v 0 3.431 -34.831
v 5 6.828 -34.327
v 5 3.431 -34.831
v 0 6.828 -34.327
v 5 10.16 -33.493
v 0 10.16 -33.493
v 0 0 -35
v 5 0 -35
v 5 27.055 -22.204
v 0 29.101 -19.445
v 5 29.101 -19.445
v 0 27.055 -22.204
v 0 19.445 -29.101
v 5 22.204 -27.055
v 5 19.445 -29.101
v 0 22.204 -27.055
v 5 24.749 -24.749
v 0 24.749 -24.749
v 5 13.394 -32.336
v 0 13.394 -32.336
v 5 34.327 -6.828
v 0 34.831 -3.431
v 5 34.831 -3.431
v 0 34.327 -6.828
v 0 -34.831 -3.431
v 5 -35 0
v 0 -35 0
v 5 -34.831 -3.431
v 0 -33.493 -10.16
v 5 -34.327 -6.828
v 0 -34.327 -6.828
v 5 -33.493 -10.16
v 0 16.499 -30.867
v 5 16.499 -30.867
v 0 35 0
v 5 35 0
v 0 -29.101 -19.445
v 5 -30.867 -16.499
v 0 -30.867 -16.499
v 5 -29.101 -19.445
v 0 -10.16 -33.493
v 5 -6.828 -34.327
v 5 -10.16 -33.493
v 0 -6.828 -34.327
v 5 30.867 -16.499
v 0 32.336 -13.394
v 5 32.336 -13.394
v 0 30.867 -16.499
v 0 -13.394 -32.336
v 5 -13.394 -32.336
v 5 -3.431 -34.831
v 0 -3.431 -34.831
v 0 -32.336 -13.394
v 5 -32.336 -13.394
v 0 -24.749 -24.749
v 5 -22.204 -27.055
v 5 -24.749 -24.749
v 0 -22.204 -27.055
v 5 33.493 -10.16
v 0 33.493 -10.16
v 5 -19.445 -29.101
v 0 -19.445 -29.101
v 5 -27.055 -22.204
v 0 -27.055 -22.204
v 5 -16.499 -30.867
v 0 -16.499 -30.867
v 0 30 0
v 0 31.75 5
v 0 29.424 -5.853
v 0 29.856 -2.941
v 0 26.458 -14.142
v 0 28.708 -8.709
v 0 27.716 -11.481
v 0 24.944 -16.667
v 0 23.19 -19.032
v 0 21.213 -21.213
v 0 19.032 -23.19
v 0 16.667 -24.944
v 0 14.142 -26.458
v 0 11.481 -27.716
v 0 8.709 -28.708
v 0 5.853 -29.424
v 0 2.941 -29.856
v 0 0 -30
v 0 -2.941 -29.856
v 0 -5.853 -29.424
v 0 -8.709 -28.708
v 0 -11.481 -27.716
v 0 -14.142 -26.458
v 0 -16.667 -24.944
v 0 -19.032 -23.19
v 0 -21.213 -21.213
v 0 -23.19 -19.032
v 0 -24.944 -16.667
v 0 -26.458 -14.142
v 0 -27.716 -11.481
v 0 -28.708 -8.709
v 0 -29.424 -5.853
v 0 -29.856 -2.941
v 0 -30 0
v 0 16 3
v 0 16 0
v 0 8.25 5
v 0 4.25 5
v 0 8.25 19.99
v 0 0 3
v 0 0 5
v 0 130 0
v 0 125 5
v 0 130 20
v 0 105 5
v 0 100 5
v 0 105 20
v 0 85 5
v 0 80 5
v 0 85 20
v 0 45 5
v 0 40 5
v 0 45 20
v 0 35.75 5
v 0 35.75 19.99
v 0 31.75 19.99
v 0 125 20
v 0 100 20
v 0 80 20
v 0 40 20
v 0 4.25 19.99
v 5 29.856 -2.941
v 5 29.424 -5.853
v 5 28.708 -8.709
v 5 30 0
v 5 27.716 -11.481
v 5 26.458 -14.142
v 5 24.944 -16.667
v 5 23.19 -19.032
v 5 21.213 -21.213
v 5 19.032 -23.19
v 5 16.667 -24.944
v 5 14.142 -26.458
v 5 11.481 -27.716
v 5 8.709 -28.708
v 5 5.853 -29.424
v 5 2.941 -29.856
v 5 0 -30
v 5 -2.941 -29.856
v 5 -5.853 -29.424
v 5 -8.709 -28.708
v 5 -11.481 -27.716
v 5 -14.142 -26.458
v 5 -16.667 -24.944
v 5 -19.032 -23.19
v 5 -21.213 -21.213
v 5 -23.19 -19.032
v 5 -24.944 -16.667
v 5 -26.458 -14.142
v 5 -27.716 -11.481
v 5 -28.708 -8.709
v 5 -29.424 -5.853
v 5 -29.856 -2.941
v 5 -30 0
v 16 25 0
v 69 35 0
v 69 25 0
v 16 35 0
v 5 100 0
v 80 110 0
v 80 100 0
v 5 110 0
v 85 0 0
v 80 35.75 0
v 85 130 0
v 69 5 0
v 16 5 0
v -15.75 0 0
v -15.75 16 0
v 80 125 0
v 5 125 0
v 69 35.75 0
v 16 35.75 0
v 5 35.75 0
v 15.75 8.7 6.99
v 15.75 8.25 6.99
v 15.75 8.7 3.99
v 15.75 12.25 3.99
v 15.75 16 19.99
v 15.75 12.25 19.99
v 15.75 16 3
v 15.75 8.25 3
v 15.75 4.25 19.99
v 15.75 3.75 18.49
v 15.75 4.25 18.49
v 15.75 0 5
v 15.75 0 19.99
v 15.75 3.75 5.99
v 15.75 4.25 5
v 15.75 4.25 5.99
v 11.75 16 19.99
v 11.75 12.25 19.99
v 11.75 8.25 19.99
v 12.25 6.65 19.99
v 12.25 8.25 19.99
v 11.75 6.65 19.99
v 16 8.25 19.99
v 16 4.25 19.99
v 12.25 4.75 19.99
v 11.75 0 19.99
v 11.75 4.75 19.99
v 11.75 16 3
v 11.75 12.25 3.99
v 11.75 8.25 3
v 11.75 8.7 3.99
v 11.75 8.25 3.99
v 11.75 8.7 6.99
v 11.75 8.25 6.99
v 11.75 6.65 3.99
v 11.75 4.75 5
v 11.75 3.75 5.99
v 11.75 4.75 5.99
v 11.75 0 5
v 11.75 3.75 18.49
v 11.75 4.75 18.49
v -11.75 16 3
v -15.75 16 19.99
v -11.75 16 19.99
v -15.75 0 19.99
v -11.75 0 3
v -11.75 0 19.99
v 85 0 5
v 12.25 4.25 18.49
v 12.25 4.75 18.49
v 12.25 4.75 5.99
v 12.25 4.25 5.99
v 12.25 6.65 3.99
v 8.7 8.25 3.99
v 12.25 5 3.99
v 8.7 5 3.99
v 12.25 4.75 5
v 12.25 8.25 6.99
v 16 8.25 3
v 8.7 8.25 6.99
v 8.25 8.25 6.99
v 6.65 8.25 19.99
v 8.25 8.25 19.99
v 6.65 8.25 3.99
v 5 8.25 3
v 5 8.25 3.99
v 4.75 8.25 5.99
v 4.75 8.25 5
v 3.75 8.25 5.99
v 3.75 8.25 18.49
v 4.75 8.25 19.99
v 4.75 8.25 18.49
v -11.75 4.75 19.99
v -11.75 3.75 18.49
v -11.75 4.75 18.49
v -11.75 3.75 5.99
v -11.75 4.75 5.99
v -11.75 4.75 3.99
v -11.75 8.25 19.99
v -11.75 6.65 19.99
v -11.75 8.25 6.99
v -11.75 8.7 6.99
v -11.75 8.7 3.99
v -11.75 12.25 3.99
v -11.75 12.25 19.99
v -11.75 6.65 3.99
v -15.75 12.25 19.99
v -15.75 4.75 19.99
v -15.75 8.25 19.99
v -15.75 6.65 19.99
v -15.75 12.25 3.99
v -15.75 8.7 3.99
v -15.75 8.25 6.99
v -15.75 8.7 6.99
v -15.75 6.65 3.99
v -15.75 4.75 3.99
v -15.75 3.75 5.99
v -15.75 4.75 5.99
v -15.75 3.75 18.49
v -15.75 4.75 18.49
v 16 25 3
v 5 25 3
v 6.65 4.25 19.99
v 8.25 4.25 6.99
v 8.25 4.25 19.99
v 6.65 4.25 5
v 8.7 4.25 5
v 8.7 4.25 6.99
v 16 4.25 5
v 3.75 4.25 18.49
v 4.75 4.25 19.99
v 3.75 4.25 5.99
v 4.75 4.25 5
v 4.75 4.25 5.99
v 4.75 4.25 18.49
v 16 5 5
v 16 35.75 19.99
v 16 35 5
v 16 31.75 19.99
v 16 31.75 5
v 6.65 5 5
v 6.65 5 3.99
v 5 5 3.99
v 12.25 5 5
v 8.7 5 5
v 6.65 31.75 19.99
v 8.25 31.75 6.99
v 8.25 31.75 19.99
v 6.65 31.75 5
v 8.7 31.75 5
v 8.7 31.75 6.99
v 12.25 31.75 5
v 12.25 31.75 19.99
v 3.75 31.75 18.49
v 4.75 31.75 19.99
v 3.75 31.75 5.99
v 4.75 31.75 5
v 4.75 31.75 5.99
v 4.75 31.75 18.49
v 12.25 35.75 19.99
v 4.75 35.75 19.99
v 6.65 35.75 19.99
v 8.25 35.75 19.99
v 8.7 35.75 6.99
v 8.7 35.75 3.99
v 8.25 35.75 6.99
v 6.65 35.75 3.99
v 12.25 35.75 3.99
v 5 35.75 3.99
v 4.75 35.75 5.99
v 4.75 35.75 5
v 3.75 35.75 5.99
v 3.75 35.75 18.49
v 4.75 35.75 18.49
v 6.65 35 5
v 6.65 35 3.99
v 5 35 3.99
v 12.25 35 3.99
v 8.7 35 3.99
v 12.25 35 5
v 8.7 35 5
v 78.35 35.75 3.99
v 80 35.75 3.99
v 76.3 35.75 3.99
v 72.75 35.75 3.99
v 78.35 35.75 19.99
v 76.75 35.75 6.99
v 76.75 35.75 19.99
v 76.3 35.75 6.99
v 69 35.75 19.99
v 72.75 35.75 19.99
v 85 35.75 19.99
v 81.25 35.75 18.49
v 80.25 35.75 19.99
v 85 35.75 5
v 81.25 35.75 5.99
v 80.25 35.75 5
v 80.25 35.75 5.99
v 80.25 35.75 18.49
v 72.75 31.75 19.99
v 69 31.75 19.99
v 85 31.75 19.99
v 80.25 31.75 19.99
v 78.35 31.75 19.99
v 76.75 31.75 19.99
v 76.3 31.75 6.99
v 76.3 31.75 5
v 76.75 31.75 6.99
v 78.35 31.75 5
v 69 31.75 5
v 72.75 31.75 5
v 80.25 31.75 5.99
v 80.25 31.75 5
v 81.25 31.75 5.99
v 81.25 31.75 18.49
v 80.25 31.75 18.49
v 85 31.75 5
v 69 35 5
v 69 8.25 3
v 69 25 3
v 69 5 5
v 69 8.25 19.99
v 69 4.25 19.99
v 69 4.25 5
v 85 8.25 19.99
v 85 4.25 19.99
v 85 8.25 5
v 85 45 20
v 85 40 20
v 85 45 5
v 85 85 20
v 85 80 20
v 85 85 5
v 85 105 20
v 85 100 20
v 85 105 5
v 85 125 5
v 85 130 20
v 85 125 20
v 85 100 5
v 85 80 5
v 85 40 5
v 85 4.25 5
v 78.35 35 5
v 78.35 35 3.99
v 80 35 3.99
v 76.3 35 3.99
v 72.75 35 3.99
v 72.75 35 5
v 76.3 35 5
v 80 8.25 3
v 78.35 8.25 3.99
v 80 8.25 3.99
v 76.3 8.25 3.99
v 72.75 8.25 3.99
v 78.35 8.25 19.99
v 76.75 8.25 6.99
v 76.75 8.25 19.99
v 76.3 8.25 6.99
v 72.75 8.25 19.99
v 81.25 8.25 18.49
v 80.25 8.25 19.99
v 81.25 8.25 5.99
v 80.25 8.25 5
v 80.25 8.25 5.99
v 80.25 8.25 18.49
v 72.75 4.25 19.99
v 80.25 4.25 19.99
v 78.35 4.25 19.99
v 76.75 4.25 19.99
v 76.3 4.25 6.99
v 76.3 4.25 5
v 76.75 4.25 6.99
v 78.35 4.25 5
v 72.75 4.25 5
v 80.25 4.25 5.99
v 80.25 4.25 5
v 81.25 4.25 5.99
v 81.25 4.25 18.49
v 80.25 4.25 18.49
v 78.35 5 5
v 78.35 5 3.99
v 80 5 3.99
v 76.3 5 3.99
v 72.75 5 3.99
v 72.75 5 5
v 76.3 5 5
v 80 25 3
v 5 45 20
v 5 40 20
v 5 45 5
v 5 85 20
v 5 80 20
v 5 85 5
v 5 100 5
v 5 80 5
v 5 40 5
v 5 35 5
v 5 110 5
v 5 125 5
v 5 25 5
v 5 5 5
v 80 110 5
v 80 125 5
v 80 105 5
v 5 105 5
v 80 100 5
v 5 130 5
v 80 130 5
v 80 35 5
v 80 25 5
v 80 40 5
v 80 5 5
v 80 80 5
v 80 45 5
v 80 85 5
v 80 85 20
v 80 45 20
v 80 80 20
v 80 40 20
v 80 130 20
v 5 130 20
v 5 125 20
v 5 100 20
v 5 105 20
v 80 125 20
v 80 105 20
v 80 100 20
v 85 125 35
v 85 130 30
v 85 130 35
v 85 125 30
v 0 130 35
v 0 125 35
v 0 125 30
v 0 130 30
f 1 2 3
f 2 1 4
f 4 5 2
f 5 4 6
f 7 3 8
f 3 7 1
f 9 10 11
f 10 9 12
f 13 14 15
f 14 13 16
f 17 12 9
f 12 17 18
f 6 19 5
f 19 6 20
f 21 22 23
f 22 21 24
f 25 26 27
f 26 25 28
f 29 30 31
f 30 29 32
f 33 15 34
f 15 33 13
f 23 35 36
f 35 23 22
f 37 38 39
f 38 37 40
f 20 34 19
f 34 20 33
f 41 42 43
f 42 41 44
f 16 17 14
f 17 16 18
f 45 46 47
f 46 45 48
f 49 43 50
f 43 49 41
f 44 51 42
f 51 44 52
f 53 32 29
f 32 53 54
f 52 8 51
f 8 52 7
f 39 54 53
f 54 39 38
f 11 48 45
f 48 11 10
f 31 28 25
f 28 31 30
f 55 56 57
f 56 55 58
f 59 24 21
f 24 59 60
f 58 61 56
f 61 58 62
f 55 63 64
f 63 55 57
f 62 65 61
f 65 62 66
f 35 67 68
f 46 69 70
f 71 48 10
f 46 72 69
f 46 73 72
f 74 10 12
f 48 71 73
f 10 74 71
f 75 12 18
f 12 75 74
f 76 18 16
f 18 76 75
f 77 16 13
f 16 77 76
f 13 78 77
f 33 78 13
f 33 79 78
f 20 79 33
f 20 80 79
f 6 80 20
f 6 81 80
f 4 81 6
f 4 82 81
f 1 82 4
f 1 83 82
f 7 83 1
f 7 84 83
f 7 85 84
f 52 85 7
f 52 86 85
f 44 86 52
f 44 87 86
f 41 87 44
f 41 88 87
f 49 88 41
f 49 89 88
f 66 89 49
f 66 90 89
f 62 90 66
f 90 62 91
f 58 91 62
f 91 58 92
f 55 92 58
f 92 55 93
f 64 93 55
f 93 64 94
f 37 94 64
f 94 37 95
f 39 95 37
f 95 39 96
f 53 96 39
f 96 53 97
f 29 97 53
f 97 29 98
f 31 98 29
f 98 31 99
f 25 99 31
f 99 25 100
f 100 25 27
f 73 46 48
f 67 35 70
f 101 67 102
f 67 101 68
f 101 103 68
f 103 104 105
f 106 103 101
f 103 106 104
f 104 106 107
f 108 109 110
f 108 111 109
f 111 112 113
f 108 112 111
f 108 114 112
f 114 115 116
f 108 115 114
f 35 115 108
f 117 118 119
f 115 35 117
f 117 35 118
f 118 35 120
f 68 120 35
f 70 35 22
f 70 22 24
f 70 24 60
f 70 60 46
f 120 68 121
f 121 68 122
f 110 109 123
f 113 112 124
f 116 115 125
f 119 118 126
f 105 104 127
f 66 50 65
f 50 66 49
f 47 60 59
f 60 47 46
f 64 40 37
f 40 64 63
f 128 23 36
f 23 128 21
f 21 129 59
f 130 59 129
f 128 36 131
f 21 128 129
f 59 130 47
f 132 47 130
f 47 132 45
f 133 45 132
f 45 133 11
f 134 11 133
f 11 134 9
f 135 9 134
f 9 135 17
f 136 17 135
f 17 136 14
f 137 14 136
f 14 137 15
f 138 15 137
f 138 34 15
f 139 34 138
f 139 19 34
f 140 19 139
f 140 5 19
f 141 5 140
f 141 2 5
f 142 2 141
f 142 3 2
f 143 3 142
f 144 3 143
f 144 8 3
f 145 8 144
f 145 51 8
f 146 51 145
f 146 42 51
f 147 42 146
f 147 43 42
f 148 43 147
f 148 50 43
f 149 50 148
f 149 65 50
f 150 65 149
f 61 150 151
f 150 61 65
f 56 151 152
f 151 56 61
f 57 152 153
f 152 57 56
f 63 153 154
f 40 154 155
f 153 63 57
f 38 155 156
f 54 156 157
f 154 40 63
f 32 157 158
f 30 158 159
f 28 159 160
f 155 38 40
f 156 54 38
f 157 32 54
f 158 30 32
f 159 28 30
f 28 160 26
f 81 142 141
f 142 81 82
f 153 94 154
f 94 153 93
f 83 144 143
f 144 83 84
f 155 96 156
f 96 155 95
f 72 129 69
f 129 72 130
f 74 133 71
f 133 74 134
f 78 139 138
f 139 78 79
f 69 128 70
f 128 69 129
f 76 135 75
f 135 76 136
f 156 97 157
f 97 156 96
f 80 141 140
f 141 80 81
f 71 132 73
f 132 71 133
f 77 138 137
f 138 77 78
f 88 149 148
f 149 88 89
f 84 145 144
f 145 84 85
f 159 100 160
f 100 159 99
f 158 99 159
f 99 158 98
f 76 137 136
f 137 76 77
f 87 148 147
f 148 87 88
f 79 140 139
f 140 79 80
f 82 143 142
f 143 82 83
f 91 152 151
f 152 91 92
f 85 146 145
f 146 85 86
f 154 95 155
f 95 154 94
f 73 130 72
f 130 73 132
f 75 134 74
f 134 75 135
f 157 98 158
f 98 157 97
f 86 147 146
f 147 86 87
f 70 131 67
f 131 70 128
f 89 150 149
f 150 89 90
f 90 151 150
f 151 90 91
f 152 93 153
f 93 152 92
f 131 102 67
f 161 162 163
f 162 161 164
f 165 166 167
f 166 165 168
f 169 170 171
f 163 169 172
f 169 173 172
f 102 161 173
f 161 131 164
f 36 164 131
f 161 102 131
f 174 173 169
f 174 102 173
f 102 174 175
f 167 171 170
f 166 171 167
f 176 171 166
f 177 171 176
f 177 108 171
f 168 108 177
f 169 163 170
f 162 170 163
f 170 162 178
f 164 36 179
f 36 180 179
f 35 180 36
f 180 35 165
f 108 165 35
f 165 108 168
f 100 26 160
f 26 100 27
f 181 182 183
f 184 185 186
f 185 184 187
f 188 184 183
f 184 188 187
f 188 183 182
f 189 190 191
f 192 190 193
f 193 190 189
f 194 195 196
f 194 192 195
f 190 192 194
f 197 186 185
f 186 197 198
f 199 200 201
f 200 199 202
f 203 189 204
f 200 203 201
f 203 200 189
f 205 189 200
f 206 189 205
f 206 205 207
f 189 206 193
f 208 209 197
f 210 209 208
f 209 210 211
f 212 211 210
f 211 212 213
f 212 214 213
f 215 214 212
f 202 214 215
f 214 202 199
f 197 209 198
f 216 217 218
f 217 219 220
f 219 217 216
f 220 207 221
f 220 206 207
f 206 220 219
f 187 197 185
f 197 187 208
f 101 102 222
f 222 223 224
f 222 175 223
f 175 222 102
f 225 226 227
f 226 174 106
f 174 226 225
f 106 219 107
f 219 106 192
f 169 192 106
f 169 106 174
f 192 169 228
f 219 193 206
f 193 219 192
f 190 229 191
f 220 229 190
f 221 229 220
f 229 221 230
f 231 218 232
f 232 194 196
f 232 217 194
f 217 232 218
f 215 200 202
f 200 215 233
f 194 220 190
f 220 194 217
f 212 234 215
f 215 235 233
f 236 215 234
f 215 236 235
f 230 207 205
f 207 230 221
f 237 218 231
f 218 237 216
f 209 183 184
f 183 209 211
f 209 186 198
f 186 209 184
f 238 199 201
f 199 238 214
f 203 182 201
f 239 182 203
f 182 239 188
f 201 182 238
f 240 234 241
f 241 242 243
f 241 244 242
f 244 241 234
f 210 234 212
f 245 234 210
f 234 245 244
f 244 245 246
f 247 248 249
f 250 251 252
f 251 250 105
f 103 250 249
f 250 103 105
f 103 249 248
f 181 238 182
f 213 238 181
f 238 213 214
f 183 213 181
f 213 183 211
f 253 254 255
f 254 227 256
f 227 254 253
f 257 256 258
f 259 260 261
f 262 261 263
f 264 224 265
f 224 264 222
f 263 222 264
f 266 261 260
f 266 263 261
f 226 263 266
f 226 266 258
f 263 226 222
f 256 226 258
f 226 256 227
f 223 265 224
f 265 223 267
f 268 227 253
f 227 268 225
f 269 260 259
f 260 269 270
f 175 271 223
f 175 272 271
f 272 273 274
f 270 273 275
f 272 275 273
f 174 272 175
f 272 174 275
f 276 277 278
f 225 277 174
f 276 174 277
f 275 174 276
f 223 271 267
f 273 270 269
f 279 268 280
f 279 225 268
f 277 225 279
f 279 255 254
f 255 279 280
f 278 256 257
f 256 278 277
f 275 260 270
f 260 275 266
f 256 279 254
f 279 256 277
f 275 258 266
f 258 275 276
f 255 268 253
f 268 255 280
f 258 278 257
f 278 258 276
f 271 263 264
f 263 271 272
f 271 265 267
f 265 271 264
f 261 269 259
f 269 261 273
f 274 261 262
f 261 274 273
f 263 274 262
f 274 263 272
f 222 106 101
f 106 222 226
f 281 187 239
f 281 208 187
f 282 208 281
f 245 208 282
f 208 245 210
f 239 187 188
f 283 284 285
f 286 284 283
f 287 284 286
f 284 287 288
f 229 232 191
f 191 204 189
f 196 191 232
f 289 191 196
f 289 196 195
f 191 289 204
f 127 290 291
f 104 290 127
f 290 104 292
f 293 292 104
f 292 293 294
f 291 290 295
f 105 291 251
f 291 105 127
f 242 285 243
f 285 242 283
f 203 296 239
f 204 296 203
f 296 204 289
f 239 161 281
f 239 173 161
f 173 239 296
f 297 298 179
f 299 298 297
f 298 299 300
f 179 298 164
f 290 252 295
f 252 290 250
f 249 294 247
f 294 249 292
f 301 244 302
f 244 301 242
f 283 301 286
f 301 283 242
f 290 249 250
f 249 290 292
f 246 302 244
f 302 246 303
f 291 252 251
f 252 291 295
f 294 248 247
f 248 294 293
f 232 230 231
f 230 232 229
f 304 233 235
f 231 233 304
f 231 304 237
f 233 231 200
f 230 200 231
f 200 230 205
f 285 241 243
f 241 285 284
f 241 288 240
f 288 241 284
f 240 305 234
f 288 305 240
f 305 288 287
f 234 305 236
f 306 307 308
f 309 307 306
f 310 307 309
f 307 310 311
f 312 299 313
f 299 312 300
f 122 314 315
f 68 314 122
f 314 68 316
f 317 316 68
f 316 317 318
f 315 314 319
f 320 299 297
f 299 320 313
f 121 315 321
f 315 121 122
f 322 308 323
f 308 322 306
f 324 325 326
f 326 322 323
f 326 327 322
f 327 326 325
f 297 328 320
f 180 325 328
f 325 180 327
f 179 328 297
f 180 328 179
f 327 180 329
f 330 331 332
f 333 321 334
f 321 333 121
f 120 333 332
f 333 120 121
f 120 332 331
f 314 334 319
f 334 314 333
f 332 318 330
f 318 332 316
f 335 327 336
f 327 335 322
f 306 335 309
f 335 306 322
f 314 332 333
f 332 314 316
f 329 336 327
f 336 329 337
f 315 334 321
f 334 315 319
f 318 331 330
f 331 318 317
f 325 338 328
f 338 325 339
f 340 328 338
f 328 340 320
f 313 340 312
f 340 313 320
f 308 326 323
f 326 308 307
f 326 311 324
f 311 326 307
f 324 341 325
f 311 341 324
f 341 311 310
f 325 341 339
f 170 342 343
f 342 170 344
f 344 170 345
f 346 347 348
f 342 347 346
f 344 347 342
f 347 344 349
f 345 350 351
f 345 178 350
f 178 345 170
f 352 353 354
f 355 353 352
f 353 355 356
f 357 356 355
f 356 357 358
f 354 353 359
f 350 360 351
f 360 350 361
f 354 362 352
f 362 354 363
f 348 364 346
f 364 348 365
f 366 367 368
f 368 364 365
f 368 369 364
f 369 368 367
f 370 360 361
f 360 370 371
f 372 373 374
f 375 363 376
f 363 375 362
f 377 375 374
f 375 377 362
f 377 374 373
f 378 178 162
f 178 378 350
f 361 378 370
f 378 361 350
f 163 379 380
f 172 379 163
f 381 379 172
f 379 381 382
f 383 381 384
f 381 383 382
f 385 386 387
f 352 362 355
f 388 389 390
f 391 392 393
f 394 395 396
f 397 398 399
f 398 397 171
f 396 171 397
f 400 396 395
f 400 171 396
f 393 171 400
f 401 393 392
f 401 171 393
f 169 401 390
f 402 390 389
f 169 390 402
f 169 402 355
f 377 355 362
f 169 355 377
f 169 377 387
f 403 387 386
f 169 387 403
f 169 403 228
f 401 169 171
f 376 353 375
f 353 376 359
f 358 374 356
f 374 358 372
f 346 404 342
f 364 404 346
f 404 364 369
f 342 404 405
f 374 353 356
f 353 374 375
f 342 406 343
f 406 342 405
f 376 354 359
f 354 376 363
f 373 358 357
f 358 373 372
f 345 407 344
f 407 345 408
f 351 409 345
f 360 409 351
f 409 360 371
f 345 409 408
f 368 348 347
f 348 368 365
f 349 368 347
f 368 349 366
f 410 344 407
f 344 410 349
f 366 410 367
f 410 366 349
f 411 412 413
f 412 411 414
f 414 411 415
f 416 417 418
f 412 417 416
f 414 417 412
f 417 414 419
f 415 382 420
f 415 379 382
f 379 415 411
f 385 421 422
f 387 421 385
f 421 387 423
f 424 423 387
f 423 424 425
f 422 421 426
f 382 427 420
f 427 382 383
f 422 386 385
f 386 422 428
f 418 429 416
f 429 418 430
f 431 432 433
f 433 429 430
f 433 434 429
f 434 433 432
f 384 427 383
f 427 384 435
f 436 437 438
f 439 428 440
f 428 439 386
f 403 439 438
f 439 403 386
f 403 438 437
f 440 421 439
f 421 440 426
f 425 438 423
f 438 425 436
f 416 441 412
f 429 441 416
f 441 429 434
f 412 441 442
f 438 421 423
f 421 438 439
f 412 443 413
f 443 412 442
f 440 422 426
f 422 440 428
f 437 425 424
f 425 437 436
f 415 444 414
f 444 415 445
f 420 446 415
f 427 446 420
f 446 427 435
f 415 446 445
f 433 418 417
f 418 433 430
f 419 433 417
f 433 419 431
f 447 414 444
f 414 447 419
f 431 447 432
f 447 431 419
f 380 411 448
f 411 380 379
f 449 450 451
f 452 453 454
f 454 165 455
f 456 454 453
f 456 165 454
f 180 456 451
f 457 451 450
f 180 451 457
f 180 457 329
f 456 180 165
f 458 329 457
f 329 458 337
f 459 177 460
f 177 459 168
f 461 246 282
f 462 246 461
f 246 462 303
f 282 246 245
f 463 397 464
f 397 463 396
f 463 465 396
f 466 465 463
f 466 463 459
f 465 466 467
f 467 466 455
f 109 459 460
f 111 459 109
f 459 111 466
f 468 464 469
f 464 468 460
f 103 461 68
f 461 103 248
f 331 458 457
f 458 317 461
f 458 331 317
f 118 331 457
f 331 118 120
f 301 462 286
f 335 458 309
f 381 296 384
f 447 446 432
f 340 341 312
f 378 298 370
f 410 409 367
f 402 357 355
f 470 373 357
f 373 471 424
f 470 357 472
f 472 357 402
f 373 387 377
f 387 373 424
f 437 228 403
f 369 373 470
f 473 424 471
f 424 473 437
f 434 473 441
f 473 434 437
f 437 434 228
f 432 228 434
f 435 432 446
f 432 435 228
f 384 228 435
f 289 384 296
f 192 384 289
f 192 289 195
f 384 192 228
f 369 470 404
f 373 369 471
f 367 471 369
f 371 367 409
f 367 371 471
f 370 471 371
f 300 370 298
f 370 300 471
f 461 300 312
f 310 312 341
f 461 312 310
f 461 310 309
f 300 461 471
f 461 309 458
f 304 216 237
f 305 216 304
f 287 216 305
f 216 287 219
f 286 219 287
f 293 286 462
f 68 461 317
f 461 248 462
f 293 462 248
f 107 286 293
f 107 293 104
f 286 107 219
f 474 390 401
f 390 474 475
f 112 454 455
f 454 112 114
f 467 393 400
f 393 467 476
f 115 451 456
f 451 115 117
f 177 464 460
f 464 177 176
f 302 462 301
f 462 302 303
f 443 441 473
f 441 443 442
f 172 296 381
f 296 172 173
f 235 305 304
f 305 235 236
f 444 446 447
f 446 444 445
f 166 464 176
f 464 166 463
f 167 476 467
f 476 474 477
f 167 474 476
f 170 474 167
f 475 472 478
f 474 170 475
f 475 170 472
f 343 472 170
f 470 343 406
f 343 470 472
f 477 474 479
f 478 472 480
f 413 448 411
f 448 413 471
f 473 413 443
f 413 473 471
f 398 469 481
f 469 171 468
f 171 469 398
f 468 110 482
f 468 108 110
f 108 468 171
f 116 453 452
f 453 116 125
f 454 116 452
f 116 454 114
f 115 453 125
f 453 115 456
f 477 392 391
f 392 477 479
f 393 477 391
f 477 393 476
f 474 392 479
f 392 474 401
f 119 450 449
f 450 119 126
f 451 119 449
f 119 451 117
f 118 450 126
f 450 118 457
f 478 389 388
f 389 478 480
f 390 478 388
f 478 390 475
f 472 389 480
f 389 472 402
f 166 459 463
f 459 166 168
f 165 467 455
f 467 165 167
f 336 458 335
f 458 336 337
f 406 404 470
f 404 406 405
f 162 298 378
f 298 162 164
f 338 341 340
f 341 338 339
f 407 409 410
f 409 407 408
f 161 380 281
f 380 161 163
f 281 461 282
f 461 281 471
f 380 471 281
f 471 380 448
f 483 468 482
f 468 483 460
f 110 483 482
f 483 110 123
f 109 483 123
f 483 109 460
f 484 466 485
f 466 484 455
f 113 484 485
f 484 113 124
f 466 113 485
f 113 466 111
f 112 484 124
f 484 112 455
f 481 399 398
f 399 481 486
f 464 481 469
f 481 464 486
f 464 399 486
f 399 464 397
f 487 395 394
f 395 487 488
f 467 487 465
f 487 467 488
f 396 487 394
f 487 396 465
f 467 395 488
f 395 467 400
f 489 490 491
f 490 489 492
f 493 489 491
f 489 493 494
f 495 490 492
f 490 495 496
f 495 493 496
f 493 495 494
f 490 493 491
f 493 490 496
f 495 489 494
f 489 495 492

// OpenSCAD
// printer ready version of the robot


module oneSnap(){
  servoMPT = 2.5;   // servo mounting plate thickness
  mpt = servoMPT + 0.4;  // servo slot
  springT = 1.6; 

  difference(){
    translate([0,0,0])cube([4,16,18]);
    translate([-1,3.75,4]) cube([6,mpt,12.5]);
    translate([-1,4.75,2]) cube([6,mpt-1,18]);

    translate([-1,3.75+mpt+springT,2]) cube([6,4.0,20]);
  }    
  translate([0,6.7,0])cube([4,2,5.]);  
}



module snapJoint(servoRot,armRot){
  ys = 5;
  zs = 7.7+1.5;
  translate([11.75,0,1.99])oneSnap();
  translate([-15.75,0,1.99])oneSnap();
  translate([0,3+ys,zs-7.7])cube([31.5,16,3],center=true);

  /**
    
    if(servoRot == 1){
    translate([-5,22.2,12.2])rotate([90,0,0])color("blue")servo(armRot);
  } else {
    translate([5,22.2,12.2])rotate([90,180,0])color("red")servo(armRot);
  }

*/


}



module frame(){ // 80x100
  cube([5,125,5]);
  cube([85,5,5]);
  translate([80,0,0])cube([5,125,5]);
  translate([0,125,0])cube([85,5,5]);
  translate([0,20,0])rotate([0,0,-90])snapJoint(1,120);
  translate([85,20,0])rotate([0,0,90])snapJoint(0,120);

   // translate([0,36,25])cube([85,55,10]);   // breadboard

    translate([0,80,0])cube([5,5,20]);  // post
    translate([80,80,0])cube([5,5,20]);  // post
    translate([0,40,0])cube([5,5,20]); // post
    translate([80,40,0])cube([5,5,20]); // post
    
    translate([0,105,0])cube([85,5,5]); //underside support back
    translate([0,100,0])cube([85,5,5]);
    
    translate([0,30,0])cube([85,5,5]); // underside support front
    translate([0,25,0])cube([85,5,5]);
    
    translate([0,125,0])cube([5,5,20]);// 4 posts for holding power supply
    translate([0,100,0])cube([5,5,20]);
    translate([80,125,0])cube([5,5,20]);
    translate([80,100,0])cube([5,5,20]);
}




module supportFrame(){ //This is for the top support for the bboard
    
  translate([0,125,30])cube([85,5,5]);
    
    
    }

module rail(){ // rail that the frame slides on 
   difference(){
    translate([0,0,0])rotate([0,90,0])cylinder(d=70,h=5,$fn=64);
    translate([-2,0,0])rotate([0,90,0])cylinder(d=60,h=10,$fn=64);
    translate([-5,-35,0])cube([25,75,40]);
   }
    }


module wheelLeft(){ //left wheel
    translate([0,0,13])rotate([0,90,0])cylinder(d=100,h=5,$fn=64);
    
    }



//wheelLeft();
//translate([80,95,0])railTwo();
//translate([0,95,0]) this is the translation for the rail
//translate([-20,0,0]) this is the translation for the snap joint
    //this translation just moves it out of the way so its legible.
    
    
 //PRINT THE FOLLOWING
    
//print 2 rails separately
rail();

//Print the frame
frame();

//print 2 of these supports
supportFrame();
    
// print 2 of these snap joints    
snapJoint();
